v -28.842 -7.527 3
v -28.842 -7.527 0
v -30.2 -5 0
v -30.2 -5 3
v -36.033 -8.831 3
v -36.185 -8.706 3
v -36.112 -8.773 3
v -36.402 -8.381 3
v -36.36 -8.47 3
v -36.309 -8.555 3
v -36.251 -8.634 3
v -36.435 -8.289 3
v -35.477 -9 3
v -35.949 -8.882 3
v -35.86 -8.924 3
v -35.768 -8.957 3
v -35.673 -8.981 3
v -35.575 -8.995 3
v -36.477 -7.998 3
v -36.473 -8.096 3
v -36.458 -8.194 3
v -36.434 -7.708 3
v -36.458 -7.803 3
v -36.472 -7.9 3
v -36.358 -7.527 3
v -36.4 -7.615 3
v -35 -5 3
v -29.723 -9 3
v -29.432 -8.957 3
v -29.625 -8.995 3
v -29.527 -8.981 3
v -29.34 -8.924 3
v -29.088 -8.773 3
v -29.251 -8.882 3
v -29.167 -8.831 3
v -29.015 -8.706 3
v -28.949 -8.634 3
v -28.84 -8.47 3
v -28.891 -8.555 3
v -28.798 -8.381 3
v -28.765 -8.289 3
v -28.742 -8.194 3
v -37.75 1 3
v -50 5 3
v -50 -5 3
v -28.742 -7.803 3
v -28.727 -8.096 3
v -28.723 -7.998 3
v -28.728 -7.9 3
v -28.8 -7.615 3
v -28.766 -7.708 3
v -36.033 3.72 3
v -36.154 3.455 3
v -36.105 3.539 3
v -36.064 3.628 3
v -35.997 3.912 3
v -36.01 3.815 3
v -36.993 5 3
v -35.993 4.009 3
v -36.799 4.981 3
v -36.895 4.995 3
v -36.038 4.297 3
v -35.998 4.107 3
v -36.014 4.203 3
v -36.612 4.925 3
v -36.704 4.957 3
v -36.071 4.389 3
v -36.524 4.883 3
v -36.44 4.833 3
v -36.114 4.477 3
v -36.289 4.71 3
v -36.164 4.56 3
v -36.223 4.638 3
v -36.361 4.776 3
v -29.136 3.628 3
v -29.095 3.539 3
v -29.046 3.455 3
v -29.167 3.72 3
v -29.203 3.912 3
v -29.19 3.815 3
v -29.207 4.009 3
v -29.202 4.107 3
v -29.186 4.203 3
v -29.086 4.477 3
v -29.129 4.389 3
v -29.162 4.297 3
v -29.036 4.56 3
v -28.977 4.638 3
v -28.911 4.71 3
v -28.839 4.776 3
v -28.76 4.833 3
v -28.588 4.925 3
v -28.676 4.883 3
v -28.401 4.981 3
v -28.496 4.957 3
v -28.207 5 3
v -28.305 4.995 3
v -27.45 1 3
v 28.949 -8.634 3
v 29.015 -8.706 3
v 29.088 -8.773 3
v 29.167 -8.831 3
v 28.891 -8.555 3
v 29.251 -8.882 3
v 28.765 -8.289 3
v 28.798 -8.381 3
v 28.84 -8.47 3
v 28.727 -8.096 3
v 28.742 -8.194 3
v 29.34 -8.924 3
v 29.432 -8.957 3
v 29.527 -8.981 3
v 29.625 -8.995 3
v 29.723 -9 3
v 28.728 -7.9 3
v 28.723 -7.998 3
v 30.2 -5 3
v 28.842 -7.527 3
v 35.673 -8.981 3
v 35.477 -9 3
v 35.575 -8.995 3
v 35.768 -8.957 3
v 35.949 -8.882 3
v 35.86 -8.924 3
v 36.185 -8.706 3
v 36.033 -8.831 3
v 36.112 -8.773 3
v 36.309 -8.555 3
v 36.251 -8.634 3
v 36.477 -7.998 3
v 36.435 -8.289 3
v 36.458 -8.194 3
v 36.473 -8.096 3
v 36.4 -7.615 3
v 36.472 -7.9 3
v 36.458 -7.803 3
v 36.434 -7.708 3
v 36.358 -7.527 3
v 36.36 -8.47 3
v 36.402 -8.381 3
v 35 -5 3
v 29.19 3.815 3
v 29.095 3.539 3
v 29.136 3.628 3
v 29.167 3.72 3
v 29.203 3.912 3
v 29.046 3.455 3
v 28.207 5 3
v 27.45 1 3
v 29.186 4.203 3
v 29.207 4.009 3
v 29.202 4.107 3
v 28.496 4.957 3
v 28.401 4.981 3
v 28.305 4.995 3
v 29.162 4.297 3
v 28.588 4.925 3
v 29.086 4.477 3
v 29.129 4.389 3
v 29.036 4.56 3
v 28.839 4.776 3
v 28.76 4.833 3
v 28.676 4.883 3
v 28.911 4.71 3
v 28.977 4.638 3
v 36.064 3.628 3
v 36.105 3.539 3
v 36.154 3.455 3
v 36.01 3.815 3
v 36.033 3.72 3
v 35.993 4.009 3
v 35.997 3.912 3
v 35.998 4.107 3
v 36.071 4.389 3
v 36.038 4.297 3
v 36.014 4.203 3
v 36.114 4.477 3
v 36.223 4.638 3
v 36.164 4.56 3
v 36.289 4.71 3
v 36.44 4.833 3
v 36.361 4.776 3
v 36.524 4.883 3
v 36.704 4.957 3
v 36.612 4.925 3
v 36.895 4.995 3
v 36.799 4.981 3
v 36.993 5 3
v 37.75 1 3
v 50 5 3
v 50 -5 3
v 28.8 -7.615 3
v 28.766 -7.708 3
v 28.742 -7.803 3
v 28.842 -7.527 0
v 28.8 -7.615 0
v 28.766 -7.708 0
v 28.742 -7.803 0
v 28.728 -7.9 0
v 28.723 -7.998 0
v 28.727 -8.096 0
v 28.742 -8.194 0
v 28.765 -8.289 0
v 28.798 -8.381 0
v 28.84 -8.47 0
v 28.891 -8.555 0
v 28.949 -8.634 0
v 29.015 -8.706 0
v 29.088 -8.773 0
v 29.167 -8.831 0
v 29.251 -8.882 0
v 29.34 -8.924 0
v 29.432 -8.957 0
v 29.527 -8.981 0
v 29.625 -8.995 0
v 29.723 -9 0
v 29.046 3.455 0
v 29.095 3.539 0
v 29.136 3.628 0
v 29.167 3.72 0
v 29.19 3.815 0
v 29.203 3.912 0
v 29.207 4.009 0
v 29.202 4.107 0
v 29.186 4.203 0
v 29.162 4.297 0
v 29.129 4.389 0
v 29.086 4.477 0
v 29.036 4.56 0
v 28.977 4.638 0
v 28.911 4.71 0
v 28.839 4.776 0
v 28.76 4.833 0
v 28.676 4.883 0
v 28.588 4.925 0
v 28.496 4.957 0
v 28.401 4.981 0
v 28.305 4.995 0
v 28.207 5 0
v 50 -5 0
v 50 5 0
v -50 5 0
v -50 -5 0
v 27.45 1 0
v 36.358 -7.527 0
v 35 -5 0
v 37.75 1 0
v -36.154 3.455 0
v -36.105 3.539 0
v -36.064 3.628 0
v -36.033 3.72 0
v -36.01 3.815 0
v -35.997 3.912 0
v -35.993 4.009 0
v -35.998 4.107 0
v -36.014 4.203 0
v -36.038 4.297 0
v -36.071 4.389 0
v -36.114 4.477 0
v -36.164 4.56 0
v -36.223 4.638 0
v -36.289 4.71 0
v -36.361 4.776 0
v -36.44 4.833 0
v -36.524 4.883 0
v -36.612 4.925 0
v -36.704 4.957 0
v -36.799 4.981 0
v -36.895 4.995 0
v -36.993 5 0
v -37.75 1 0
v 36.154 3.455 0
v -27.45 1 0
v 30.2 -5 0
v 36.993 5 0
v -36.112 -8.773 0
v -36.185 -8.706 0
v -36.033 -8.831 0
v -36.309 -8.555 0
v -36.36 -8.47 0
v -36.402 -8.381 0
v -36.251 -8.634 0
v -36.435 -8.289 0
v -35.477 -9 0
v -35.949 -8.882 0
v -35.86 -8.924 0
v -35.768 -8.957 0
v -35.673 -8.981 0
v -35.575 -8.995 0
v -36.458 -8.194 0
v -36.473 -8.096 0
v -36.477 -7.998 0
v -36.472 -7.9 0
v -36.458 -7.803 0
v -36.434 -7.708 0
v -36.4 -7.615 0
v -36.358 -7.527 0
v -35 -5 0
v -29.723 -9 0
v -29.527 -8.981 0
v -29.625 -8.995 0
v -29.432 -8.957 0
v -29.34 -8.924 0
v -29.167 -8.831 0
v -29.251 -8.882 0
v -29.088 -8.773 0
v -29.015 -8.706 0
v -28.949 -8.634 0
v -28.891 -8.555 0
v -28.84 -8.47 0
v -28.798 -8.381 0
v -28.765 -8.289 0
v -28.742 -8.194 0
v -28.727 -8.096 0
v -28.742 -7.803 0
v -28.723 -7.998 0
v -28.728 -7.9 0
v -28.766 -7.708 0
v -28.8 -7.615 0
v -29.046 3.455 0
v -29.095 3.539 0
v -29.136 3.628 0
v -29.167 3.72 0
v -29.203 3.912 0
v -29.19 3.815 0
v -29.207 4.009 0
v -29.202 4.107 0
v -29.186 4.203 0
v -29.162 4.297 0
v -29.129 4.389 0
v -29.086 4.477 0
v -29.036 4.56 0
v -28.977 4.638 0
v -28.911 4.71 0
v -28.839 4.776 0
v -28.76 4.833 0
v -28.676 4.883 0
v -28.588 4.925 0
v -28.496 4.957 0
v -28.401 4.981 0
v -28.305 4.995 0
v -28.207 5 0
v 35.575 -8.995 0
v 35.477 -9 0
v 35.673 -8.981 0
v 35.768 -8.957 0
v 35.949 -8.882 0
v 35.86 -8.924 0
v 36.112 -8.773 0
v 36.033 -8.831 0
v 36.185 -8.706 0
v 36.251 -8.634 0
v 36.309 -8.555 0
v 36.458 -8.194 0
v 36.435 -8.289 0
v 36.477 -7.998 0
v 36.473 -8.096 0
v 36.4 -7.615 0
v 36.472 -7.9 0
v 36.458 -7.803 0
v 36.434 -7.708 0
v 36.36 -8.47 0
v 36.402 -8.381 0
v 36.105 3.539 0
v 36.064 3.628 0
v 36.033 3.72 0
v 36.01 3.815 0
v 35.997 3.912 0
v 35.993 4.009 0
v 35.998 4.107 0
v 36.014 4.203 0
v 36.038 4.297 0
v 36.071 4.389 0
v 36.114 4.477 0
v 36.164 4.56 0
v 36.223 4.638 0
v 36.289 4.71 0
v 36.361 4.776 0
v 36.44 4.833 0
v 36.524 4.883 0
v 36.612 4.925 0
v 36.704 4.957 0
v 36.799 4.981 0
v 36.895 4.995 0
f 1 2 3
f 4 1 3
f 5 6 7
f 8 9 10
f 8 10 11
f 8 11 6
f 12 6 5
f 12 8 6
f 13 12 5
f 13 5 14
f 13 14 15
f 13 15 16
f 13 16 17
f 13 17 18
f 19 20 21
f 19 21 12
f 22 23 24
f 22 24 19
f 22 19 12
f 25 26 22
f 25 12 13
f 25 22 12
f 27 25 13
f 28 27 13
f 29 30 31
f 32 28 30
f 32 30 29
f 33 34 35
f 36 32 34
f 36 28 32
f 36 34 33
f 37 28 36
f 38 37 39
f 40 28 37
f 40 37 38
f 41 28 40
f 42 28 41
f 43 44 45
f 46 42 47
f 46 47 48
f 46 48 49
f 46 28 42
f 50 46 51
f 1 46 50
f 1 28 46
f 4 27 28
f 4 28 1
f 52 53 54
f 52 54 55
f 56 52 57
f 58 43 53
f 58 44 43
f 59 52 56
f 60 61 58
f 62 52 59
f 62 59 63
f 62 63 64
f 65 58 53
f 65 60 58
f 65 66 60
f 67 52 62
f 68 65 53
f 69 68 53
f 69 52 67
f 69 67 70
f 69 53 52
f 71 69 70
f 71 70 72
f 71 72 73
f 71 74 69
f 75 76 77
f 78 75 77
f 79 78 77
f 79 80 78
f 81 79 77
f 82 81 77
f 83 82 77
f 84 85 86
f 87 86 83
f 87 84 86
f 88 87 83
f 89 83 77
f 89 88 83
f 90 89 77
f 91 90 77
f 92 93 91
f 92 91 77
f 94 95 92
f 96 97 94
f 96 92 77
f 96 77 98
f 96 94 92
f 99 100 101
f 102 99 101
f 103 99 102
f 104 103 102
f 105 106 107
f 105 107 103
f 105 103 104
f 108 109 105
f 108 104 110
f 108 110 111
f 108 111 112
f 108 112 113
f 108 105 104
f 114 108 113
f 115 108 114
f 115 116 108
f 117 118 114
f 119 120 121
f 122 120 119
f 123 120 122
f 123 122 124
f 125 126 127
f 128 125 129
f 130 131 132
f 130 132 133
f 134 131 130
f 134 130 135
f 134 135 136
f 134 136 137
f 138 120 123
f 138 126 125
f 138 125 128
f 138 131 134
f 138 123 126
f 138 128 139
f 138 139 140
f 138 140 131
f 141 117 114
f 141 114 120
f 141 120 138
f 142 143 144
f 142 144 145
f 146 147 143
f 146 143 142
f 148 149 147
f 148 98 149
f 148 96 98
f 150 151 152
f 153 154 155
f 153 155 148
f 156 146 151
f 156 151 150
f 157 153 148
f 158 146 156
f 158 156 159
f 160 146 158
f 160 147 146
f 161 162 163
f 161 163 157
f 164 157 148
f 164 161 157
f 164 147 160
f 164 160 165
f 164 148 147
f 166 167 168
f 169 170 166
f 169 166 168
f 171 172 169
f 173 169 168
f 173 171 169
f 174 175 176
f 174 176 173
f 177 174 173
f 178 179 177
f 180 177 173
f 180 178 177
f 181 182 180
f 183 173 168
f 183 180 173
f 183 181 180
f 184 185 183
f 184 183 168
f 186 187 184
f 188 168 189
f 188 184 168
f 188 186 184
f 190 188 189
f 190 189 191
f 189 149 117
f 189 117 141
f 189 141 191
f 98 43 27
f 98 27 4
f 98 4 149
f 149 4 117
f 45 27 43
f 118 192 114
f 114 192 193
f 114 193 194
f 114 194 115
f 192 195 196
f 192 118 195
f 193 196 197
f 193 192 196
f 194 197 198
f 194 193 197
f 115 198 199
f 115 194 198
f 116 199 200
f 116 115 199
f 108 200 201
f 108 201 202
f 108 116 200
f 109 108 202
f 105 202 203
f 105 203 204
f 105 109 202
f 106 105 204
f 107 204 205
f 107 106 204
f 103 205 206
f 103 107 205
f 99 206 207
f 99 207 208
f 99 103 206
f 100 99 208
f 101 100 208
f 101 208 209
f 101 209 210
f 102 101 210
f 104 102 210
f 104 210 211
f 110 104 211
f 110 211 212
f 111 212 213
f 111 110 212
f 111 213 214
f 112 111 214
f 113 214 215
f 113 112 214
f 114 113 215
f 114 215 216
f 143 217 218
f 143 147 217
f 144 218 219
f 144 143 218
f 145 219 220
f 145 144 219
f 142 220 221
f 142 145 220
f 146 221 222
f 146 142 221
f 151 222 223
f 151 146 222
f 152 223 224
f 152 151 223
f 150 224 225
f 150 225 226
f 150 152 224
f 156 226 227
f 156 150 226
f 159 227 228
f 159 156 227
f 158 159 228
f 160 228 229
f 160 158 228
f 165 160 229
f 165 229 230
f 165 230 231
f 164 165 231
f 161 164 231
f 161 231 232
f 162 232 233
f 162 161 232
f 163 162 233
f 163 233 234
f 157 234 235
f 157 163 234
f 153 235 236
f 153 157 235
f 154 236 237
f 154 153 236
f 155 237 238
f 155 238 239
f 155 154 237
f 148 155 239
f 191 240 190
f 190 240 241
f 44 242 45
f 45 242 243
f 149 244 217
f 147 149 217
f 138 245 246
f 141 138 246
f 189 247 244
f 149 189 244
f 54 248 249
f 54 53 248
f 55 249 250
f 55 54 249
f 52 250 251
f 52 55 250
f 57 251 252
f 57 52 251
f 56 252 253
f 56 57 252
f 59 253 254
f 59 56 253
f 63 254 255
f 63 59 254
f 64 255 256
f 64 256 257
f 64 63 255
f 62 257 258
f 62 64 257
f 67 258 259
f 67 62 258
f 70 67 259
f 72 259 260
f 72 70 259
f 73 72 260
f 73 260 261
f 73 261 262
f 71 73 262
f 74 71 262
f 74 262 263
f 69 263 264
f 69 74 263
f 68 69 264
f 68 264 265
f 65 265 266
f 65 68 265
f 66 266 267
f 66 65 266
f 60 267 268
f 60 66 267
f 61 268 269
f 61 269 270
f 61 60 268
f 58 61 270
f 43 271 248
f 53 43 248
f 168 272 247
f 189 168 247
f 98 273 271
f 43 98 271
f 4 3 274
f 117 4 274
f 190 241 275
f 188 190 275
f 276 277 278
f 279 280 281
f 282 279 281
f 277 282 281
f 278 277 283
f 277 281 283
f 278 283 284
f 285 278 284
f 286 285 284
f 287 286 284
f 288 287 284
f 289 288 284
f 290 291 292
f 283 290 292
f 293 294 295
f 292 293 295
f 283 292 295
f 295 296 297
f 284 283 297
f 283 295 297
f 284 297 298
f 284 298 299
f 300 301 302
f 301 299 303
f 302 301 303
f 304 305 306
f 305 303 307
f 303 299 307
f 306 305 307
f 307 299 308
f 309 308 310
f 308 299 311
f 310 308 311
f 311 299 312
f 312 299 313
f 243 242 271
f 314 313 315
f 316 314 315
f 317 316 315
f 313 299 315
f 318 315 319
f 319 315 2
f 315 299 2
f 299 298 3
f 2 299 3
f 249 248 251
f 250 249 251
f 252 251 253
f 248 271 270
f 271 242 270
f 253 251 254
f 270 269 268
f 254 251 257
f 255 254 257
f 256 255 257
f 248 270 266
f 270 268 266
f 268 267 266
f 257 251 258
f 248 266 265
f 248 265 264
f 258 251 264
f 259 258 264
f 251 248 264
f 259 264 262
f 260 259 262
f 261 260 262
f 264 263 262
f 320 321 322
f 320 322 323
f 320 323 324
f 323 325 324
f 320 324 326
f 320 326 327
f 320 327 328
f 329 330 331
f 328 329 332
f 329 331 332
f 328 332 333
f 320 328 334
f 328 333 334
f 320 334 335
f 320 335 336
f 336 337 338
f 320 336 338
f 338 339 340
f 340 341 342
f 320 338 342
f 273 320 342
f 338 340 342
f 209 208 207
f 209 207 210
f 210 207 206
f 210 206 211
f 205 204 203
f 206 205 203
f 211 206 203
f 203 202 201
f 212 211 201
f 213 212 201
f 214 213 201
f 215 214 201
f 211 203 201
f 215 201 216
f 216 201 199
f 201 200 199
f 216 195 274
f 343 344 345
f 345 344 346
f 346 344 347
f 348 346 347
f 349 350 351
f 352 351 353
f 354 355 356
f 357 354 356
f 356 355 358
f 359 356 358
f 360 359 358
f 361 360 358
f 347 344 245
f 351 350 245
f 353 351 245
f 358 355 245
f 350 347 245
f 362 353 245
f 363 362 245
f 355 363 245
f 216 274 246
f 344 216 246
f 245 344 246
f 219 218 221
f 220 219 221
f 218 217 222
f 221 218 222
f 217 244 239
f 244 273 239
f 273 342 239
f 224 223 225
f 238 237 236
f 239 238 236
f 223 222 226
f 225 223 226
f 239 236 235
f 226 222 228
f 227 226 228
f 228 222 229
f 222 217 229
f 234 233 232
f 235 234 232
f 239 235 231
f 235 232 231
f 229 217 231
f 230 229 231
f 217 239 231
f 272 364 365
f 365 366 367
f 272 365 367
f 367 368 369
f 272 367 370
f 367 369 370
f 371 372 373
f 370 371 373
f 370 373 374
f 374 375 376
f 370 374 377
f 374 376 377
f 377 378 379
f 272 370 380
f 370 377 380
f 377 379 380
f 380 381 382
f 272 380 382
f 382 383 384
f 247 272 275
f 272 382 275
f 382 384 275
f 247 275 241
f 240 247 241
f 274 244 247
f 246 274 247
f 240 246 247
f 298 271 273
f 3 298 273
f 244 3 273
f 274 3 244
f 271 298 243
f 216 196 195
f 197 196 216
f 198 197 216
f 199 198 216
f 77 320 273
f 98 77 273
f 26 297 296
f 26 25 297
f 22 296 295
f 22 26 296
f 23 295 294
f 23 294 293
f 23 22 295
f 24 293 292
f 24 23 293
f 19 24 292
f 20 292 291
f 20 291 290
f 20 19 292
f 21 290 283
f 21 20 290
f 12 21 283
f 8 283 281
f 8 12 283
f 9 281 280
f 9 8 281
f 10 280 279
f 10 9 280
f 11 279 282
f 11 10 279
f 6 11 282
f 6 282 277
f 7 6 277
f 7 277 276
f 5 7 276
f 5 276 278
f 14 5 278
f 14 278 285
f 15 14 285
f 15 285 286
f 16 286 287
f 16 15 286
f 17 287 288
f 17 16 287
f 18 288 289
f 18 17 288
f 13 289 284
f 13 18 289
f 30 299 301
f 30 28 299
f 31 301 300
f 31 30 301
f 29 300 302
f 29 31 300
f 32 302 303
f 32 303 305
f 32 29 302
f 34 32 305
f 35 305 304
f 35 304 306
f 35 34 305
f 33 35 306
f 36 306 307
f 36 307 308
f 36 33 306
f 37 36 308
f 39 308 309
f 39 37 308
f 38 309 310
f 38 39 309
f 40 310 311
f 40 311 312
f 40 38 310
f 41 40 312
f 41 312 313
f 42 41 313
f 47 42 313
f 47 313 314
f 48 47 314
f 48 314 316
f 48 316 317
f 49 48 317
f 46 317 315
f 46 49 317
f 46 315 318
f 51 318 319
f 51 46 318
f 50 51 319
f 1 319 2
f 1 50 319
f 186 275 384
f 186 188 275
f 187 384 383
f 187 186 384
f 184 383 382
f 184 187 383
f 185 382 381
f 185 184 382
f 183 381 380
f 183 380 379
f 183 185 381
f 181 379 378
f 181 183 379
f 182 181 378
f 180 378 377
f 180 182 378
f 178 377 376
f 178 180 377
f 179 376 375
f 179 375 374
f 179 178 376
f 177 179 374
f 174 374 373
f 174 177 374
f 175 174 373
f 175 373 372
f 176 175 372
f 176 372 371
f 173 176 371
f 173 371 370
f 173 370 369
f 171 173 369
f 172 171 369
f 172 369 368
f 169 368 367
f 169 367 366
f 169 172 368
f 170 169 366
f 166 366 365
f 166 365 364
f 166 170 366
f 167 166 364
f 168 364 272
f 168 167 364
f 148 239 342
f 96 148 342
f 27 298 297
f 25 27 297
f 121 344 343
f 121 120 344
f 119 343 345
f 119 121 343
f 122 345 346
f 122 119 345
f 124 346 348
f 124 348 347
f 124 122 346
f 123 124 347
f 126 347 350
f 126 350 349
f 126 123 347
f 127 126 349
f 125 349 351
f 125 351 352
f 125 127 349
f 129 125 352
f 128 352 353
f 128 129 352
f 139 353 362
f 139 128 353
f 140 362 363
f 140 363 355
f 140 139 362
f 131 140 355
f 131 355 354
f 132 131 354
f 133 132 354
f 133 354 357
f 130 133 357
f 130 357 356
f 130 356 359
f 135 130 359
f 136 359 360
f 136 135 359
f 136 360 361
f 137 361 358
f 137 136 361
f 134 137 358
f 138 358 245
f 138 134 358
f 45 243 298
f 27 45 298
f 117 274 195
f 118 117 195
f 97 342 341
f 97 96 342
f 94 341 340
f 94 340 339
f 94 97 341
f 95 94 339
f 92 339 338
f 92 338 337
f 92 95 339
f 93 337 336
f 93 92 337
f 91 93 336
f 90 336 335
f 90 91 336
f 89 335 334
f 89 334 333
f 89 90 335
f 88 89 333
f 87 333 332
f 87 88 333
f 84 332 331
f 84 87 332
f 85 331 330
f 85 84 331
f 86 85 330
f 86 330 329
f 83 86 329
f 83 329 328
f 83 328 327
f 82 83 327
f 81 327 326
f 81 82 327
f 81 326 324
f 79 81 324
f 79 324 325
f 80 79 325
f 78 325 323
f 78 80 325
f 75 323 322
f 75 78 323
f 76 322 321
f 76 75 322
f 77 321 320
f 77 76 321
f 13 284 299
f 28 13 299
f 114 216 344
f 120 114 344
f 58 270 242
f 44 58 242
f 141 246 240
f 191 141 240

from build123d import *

# Parameters (mm, degrees)
F1_DEPTH = 3
F2_R     = 1


with BuildPart() as f1:
    # F0 (on Top) → F1 (new body)
    with BuildSketch(Plane.XY):
        Polygon((35, -5), (50, -5), (50, 5), (35.15, 5), (37.75, 1), (27.45, 1), (30.05, 5), (-30.05, 5), (-27.45, 1), (-37.75, 1), (-35.15, 5), (-50, 5), (-50, -5), (-35, -5), (-30.2, -5), (30.2, -5), align=None)
        Polygon((-28.05, -9), (-30.2, -5), (-35, -5), (-37.15, -9), align=None)
        Polygon((37.15, -9), (35, -5), (30.2, -5), (28.05, -9), align=None)
    extrude(amount=F1_DEPTH)

    # F2
    f2_edges = [f1.edges().sort_by_distance(p)[0] for p in [
        (-28.05, -9, 1.5),
        (-37.15, -9, 1.5),
        (37.15, -9, 1.5),
        (28.05, -9, 1.5),
        (30.05, 5, 1.5),
        (-35.15, 5, 1.5),
        (-30.05, 5, 1.5),
        (35.15, 5, 1.5),
    ]]
    fillet(f2_edges, radius=F2_R)


solid = f1.part
